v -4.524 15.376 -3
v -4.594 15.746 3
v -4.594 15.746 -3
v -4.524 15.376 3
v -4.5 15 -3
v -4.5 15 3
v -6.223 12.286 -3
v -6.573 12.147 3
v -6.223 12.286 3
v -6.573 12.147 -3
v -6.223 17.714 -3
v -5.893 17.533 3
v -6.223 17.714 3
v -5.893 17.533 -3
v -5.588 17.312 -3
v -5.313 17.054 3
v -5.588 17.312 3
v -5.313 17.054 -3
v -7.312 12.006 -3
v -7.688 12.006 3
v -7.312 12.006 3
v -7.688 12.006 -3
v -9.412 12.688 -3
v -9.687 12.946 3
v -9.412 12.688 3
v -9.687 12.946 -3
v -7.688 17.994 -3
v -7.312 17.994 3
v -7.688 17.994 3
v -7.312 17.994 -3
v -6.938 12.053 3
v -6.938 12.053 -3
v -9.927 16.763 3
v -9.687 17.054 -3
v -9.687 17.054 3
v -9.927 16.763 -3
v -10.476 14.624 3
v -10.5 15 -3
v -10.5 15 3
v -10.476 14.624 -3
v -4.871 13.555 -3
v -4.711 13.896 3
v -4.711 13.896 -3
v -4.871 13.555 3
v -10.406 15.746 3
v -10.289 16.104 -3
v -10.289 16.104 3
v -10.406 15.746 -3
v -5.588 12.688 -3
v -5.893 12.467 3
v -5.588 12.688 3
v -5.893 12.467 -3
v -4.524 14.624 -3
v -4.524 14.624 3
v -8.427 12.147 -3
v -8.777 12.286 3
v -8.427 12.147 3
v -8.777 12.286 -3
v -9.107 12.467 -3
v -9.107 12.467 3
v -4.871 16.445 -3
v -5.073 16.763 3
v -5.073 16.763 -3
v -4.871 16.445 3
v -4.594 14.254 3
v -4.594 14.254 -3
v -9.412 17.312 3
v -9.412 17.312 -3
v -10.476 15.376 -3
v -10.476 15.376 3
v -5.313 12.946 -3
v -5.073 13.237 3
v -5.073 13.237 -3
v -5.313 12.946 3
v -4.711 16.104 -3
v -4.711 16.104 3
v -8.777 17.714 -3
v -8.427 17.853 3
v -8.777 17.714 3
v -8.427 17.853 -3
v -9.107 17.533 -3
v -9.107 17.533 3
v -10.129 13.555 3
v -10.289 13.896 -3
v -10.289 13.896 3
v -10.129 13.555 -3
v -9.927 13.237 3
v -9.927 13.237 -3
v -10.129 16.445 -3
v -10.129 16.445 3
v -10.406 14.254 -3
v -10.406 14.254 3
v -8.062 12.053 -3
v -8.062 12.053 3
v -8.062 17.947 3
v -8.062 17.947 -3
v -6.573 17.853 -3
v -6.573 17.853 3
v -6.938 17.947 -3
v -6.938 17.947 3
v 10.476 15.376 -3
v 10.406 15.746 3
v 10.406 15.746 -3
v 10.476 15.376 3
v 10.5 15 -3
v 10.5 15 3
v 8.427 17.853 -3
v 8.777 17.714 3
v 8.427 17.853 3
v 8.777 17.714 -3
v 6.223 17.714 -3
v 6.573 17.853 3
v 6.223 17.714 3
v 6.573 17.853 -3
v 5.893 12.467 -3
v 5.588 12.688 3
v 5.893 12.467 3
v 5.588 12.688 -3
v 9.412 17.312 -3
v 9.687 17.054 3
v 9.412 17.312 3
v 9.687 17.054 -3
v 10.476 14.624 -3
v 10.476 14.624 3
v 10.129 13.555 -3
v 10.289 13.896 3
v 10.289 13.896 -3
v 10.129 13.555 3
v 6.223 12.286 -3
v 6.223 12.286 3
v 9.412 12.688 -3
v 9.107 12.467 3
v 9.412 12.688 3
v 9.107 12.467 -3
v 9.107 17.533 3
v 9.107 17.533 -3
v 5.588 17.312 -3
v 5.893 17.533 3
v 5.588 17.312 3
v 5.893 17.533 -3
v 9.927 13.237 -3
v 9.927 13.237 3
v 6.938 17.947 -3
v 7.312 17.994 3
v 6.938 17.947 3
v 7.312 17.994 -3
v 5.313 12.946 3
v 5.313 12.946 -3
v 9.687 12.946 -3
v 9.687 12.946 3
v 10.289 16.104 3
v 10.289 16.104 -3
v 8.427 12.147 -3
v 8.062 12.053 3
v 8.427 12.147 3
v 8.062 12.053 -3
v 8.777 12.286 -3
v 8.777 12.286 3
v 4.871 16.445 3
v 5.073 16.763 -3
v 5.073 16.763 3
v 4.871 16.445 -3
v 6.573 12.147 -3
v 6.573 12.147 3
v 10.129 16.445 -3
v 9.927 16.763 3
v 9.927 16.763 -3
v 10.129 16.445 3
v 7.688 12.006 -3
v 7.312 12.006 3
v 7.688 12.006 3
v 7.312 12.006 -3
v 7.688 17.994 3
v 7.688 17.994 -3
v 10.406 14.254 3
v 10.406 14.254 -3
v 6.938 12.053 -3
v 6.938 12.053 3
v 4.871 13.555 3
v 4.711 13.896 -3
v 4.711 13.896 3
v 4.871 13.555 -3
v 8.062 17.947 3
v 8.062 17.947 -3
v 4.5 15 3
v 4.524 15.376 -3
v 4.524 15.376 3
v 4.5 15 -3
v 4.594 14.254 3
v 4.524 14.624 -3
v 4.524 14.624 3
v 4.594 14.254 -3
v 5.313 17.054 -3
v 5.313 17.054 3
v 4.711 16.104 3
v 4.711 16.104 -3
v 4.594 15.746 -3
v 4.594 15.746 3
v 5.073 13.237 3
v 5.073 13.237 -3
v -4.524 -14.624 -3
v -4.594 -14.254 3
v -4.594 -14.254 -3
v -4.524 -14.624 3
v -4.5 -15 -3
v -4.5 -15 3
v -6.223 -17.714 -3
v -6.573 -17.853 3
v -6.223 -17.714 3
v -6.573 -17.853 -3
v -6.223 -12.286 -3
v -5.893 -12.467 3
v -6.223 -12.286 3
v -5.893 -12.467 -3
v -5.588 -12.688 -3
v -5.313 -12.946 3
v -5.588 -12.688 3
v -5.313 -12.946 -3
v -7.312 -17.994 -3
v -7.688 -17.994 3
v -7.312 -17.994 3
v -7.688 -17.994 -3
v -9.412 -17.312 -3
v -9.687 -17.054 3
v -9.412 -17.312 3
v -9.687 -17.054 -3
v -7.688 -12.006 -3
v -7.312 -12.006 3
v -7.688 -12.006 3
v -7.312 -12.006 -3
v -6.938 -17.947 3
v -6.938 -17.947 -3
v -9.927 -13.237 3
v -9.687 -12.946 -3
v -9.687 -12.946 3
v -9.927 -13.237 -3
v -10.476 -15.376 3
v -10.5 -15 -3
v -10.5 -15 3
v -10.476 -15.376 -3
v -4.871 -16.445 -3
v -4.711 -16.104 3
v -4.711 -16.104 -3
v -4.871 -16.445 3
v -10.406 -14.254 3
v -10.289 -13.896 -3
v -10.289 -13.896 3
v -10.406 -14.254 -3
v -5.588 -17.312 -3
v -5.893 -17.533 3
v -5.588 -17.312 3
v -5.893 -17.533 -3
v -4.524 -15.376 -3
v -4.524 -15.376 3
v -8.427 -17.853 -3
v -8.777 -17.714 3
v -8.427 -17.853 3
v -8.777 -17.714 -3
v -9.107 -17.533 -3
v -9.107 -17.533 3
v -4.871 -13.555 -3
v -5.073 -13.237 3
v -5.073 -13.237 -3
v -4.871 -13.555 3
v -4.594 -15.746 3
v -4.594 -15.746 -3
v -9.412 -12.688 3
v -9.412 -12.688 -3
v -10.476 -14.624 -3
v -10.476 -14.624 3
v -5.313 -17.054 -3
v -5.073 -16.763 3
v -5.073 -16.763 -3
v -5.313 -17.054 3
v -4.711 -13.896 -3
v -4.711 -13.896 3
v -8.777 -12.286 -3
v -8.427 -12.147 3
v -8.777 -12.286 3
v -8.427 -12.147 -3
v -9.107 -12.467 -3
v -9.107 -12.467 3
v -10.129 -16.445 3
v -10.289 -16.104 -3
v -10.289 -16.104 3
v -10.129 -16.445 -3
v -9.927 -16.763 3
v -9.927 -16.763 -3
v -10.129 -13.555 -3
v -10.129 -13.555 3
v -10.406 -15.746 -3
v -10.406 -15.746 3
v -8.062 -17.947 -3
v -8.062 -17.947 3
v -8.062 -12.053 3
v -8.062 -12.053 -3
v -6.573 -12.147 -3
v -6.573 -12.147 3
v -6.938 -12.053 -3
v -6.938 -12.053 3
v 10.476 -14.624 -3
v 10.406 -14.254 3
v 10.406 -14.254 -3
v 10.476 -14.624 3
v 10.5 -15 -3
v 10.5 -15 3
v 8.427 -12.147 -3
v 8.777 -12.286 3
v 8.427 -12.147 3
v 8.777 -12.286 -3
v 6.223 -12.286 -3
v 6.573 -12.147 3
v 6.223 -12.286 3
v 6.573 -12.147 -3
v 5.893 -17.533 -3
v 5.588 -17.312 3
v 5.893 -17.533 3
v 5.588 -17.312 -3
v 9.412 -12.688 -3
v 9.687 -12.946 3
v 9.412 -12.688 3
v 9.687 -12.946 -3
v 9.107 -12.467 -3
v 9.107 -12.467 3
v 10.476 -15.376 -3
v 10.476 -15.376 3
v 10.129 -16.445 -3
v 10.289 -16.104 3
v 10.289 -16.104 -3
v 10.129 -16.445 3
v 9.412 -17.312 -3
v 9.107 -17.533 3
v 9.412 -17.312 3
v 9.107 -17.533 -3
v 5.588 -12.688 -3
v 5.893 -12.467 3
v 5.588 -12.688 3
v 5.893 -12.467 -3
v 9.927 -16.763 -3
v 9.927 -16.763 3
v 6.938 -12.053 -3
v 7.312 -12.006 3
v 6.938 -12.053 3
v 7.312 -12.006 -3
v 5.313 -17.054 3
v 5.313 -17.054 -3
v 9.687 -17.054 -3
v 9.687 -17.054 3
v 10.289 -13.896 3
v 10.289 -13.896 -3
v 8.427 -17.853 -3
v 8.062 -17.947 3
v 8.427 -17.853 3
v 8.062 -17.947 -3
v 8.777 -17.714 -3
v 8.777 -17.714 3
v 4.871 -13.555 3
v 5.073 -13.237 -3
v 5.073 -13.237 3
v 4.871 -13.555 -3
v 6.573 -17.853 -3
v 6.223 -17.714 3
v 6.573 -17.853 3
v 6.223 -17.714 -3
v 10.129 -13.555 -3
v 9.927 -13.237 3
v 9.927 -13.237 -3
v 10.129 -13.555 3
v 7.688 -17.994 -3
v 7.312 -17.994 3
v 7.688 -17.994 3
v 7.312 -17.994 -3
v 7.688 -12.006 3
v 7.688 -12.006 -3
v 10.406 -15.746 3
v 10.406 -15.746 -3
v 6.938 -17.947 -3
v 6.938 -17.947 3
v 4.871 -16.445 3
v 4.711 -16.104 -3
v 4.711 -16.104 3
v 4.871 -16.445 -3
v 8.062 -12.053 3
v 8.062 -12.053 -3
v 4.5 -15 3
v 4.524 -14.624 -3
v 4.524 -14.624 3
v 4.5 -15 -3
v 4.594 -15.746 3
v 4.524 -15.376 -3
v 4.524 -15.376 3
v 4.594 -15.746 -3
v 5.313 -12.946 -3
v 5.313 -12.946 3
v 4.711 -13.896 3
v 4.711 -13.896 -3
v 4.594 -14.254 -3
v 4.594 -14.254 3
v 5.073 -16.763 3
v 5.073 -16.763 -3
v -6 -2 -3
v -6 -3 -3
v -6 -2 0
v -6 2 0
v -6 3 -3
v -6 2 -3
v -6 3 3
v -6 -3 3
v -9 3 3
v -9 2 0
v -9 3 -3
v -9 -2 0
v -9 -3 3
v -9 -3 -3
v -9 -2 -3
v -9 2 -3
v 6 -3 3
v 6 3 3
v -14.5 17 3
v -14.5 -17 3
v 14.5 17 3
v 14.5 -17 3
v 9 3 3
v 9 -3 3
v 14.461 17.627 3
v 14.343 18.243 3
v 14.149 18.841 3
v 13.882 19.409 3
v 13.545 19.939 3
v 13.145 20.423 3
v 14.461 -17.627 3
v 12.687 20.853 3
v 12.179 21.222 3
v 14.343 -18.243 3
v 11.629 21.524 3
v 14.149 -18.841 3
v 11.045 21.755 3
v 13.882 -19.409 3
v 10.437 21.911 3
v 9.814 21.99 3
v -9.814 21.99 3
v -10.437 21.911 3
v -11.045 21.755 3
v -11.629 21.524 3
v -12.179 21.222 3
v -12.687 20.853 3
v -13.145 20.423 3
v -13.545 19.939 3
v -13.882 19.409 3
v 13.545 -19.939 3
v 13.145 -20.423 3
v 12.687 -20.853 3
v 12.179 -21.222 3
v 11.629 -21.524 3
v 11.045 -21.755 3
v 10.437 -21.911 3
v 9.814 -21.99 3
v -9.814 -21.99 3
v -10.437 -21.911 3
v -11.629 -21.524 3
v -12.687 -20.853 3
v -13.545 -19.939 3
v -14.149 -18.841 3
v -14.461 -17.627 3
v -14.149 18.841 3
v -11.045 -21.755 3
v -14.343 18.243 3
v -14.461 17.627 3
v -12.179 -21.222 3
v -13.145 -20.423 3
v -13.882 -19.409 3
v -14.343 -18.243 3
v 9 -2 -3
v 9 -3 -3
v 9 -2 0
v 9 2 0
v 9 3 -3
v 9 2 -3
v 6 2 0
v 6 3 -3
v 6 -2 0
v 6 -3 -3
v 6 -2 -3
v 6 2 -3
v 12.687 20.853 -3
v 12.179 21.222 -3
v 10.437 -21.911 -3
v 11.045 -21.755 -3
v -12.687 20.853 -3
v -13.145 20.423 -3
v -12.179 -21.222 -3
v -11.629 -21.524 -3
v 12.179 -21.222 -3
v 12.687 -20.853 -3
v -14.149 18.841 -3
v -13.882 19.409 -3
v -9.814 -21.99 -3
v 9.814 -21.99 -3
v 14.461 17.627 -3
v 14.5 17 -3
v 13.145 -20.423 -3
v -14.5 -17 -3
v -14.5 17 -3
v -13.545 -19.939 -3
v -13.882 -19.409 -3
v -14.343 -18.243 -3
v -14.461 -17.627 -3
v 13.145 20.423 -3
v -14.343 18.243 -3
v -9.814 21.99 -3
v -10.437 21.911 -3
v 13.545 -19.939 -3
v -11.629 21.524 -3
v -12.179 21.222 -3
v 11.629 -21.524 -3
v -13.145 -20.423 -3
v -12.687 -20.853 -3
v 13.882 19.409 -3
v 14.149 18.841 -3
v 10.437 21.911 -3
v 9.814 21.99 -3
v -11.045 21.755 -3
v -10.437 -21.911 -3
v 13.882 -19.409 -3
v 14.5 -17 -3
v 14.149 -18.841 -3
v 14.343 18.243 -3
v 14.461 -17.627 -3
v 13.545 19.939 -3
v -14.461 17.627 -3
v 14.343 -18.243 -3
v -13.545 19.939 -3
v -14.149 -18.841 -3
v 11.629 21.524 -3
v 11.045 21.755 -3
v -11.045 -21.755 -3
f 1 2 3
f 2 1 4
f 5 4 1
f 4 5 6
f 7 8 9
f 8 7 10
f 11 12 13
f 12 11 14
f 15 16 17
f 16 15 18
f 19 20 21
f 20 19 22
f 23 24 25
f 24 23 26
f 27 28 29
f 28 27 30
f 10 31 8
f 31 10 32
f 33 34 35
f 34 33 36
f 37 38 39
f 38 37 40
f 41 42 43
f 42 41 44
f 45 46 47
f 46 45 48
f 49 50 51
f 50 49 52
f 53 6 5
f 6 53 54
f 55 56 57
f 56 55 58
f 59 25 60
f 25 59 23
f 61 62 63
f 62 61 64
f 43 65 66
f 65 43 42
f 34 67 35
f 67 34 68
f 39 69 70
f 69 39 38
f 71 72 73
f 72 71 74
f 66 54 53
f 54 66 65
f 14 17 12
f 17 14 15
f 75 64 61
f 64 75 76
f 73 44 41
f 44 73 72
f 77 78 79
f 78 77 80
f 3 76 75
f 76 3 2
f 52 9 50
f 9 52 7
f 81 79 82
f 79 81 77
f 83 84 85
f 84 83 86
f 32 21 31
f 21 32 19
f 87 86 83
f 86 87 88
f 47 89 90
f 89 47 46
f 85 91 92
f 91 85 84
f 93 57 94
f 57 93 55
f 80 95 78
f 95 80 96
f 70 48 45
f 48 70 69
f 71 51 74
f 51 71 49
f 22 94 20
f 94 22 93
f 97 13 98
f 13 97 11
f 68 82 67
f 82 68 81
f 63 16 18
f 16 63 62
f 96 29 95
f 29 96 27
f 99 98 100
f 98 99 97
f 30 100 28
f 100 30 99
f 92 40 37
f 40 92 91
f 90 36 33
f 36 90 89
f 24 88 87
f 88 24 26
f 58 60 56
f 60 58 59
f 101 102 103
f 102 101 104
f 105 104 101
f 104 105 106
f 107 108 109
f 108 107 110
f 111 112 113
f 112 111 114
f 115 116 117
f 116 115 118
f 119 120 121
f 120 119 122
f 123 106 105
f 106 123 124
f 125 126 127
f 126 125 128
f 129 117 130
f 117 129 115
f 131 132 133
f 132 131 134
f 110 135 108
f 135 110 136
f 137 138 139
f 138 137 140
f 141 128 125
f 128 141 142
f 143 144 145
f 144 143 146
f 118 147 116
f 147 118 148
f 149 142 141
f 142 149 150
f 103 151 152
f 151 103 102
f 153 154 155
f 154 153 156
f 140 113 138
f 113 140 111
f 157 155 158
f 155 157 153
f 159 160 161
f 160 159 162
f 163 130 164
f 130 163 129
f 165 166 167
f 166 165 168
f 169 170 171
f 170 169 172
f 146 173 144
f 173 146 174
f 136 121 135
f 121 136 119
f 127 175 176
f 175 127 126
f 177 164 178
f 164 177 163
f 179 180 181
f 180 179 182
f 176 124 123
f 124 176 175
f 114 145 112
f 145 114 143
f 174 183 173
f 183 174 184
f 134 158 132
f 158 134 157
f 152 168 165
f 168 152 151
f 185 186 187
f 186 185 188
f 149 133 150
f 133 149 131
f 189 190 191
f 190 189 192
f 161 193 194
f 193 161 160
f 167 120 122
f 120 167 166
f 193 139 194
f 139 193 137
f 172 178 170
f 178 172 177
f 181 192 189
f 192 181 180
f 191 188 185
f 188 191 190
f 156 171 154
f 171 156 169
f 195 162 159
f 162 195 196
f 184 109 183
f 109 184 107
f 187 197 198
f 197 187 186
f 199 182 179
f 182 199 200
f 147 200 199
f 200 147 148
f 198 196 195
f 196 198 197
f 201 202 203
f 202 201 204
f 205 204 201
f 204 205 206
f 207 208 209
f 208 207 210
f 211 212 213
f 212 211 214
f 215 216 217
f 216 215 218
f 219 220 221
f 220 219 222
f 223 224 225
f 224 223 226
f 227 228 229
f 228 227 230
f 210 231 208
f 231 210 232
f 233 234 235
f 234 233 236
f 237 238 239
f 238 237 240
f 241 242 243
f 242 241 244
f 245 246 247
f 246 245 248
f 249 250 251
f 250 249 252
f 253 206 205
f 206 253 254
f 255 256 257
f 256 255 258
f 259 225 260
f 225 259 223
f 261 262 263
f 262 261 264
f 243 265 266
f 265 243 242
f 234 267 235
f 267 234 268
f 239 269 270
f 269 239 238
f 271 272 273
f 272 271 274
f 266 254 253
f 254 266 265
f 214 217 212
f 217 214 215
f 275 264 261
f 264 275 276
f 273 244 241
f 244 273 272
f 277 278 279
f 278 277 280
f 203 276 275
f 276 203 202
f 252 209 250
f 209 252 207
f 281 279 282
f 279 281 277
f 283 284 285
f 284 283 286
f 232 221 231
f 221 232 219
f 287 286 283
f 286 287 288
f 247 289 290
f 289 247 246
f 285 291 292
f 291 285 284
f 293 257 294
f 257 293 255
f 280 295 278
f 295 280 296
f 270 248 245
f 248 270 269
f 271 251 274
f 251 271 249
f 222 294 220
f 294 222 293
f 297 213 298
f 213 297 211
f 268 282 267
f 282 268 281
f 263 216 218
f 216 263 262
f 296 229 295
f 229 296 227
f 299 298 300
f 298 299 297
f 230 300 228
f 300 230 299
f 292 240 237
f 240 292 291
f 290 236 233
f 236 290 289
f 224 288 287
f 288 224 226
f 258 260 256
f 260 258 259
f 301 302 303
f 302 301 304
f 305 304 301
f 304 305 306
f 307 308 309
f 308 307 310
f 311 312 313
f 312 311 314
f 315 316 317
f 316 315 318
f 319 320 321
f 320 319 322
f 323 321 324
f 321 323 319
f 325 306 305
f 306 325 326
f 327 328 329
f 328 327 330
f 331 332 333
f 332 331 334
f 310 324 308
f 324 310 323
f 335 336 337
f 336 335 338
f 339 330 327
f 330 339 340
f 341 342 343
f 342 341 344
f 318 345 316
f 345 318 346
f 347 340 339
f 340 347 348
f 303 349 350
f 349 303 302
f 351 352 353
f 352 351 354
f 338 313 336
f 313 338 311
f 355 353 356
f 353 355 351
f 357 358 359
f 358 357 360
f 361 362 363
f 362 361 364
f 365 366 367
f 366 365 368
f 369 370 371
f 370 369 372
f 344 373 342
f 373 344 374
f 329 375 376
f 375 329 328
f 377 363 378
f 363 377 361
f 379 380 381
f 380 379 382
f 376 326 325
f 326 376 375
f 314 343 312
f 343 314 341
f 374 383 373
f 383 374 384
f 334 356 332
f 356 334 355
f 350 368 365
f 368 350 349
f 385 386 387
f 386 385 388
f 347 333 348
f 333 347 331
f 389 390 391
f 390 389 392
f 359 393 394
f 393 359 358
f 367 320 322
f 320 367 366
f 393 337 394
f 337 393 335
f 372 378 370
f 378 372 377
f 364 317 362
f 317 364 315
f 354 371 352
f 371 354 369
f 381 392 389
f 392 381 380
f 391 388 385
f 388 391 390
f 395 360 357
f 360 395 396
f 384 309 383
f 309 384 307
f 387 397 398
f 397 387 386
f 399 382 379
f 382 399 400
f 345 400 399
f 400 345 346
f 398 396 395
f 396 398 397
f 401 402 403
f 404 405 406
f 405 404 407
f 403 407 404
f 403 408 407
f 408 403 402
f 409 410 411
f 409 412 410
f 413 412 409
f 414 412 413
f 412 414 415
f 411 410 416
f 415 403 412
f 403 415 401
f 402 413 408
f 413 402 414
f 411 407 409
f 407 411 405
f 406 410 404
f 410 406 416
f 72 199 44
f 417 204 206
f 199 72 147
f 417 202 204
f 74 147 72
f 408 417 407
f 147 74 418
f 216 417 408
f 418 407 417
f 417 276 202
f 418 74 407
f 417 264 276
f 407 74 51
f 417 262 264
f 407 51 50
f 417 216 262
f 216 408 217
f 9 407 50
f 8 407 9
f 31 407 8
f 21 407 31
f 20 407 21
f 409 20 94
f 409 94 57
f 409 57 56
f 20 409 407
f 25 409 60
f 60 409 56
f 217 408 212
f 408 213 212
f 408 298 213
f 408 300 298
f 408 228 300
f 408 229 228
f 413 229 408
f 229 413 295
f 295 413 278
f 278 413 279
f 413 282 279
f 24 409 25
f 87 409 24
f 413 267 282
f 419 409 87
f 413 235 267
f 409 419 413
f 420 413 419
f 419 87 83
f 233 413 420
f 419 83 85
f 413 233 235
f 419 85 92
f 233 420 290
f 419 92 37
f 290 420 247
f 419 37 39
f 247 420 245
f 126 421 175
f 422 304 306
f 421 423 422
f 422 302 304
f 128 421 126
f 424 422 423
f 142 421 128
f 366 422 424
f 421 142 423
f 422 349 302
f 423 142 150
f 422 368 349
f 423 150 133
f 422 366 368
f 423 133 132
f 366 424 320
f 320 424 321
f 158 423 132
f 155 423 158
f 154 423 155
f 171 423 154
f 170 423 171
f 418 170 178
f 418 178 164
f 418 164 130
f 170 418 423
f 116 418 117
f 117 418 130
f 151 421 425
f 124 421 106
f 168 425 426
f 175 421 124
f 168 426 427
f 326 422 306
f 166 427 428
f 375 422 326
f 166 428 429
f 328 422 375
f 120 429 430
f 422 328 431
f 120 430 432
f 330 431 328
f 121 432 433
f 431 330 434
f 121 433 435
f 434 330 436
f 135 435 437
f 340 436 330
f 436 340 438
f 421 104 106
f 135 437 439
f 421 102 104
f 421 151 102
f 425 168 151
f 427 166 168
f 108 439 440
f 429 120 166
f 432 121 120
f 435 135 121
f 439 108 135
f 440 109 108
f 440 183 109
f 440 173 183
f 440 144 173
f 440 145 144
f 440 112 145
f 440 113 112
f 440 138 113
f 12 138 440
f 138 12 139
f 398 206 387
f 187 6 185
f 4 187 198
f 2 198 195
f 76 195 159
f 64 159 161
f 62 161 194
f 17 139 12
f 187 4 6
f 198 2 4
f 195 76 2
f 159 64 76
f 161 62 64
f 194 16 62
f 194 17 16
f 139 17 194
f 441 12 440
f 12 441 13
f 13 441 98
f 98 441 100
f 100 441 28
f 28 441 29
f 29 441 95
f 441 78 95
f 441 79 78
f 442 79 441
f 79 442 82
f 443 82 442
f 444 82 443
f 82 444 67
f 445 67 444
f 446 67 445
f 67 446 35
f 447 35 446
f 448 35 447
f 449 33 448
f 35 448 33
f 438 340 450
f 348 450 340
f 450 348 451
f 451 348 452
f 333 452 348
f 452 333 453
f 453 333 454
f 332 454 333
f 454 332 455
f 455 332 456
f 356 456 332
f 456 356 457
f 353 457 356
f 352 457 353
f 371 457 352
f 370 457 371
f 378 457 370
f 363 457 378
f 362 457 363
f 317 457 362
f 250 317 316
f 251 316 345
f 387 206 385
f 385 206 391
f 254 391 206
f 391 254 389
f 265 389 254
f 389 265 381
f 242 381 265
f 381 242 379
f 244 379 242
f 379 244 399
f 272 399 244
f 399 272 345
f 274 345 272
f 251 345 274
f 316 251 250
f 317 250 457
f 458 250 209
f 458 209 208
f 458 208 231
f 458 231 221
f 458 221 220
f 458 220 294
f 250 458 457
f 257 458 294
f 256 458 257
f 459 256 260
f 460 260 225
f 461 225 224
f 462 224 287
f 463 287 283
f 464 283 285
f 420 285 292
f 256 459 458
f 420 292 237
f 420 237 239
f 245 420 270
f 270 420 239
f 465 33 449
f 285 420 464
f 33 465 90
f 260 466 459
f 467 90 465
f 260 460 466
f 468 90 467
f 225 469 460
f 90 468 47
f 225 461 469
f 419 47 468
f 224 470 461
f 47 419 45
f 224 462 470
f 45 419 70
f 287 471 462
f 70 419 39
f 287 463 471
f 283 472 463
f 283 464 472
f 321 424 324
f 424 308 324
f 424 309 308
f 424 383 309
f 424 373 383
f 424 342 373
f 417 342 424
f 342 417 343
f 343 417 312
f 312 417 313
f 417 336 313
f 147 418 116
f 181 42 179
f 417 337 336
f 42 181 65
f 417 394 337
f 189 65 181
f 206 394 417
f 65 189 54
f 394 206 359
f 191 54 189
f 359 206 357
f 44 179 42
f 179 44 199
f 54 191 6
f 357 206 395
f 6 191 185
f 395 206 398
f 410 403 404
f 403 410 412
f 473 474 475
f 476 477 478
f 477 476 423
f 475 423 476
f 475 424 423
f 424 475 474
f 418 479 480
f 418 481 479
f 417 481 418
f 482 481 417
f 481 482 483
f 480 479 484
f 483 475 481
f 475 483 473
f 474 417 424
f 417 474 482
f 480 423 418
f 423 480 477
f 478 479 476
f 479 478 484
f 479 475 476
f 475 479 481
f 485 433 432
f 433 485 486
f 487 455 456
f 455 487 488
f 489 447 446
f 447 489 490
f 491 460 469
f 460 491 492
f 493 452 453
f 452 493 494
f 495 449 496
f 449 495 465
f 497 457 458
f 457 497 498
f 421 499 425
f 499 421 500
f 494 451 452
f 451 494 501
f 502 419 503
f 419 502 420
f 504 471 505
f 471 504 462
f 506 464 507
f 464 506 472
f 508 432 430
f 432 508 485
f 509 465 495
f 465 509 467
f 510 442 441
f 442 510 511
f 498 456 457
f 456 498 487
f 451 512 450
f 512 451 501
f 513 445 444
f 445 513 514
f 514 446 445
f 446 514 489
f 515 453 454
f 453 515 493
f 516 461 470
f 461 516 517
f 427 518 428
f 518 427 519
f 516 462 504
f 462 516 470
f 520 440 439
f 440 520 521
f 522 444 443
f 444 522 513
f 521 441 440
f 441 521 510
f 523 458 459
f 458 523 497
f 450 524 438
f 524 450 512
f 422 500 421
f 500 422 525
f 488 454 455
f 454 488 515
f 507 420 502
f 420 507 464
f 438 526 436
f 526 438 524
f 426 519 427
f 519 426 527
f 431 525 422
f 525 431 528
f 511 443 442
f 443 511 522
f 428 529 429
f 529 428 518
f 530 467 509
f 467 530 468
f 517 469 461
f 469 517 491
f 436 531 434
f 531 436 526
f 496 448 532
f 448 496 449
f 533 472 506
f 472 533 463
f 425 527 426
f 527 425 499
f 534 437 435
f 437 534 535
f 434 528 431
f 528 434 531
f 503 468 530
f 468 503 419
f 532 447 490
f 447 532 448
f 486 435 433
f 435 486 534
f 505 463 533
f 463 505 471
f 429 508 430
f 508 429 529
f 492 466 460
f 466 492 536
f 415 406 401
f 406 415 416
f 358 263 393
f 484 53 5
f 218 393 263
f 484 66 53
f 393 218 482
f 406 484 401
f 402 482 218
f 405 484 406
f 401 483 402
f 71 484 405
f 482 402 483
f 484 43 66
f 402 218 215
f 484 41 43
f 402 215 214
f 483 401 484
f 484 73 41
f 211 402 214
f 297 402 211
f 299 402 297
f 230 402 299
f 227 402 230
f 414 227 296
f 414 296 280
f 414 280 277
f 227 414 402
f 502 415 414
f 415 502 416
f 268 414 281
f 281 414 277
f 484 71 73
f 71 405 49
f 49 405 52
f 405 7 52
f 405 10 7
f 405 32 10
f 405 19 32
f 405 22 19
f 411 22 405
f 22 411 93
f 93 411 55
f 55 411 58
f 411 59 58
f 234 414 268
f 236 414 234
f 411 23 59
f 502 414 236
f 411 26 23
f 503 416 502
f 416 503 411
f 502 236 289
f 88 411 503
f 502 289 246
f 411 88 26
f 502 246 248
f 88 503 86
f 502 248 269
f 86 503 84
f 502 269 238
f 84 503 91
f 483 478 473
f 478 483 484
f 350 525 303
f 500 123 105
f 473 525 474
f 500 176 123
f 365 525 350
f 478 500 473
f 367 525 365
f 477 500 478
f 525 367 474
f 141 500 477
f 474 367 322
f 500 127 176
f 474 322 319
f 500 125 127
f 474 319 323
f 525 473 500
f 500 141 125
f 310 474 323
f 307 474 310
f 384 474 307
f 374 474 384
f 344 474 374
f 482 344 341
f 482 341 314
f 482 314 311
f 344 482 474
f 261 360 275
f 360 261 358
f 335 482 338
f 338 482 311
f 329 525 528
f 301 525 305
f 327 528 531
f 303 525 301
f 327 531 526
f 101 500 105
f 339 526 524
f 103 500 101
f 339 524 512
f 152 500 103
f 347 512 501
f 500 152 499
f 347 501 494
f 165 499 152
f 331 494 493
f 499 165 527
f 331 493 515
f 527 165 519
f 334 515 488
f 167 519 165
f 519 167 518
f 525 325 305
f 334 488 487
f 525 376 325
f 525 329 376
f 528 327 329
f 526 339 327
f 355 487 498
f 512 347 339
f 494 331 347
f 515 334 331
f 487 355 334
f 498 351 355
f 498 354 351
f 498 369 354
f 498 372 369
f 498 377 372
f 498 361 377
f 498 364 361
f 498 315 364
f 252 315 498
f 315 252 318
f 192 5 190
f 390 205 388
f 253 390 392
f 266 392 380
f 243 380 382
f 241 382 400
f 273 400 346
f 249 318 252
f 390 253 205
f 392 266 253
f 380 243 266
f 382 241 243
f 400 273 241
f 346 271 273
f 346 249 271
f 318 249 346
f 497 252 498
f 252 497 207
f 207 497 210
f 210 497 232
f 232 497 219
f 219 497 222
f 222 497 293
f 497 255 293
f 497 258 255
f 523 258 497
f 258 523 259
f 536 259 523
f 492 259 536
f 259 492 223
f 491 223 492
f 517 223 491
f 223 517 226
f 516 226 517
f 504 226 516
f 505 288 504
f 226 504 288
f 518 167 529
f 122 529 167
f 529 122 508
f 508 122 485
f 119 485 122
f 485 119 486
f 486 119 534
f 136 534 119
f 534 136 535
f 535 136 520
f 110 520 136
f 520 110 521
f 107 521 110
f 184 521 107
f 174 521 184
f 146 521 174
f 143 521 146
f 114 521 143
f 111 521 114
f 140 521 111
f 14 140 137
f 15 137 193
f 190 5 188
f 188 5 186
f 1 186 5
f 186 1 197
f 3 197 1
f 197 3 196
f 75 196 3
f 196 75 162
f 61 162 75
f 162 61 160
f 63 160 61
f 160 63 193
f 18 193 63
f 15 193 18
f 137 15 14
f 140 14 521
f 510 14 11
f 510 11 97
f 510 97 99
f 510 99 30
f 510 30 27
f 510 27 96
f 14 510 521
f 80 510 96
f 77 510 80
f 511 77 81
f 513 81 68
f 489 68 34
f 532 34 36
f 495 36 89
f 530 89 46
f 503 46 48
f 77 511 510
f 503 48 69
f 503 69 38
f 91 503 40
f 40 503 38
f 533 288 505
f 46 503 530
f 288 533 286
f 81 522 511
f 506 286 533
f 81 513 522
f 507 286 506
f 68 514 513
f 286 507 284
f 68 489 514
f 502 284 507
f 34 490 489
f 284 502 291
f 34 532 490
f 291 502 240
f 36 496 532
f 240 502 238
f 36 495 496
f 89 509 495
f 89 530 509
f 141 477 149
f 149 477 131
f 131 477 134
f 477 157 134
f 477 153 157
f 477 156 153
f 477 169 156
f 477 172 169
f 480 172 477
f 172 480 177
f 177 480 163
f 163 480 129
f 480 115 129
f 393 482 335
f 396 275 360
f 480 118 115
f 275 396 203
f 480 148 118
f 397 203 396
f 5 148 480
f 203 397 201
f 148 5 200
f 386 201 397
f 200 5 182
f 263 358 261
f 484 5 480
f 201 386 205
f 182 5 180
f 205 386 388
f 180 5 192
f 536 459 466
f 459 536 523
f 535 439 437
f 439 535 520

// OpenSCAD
$fn = 50;


difference() {
	union() {
		translate(v = [0, 0, -3.0000000000]) {
			rotate(a = [0, 0, 0]) {
				hull() {
					translate(v = [-9.5000000000, 17.0000000000, 0]) {
						rotate(a = [0, 0, 0]) {
							translate(v = [0, 0, 0]) {
								rotate(a = [0, 0, 0]) {
									cylinder(h = 6, r = 5);
								}
							}
						}
					}
					translate(v = [9.5000000000, 17.0000000000, 0]) {
						rotate(a = [0, 0, 0]) {
							translate(v = [0, 0, 0]) {
								rotate(a = [0, 0, 0]) {
									cylinder(h = 6, r = 5);
								}
							}
						}
					}
					translate(v = [-9.5000000000, -17.0000000000, 0]) {
						rotate(a = [0, 0, 0]) {
							translate(v = [0, 0, 0]) {
								rotate(a = [0, 0, 0]) {
									cylinder(h = 6, r = 5);
								}
							}
						}
					}
					translate(v = [9.5000000000, -17.0000000000, 0]) {
						rotate(a = [0, 0, 0]) {
							translate(v = [0, 0, 0]) {
								rotate(a = [0, 0, 0]) {
									cylinder(h = 6, r = 5);
								}
							}
						}
					}
				}
			}
		}
	}
	union() {
		translate(v = [-7.5000000000, 15.0000000000, -125.0000000000]) {
			rotate(a = [0, 0, 0]) {
				cylinder(h = 250, r = 3.0000000000);
			}
		}
		translate(v = [7.5000000000, 15.0000000000, -125.0000000000]) {
			rotate(a = [0, 0, 0]) {
				cylinder(h = 250, r = 3.0000000000);
			}
		}
		translate(v = [-7.5000000000, -15.0000000000, -125.0000000000]) {
			rotate(a = [0, 0, 0]) {
				cylinder(h = 250, r = 3.0000000000);
			}
		}
		translate(v = [7.5000000000, -15.0000000000, -125.0000000000]) {
			rotate(a = [0, 0, 0]) {
				cylinder(h = 250, r = 3.0000000000);
			}
		}
		translate(v = [-9.0000000000, -3.0000000000, -50]) {
			rotate(a = [0, 0, 0]) {
				cube(size = [3, 1, 100]);
			}
		}
		translate(v = [-9.0000000000, 2.0000000000, -50]) {
			rotate(a = [0, 0, 0]) {
				cube(size = [3, 1, 100]);
			}
		}
		translate(v = [-9.0000000000, -3.0000000000, 0]) {
			rotate(a = [0, 0, 0]) {
				cube(size = [3, 6, 3]);
			}
		}
		translate(v = [6.0000000000, -3.0000000000, -50]) {
			rotate(a = [0, 0, 0]) {
				cube(size = [3, 1, 100]);
			}
		}
		translate(v = [6.0000000000, 2.0000000000, -50]) {
			rotate(a = [0, 0, 0]) {
				cube(size = [3, 1, 100]);
			}
		}
		translate(v = [6.0000000000, -3.0000000000, 0]) {
			rotate(a = [0, 0, 0]) {
				cube(size = [3, 6, 3]);
			}
		}
	}
}
